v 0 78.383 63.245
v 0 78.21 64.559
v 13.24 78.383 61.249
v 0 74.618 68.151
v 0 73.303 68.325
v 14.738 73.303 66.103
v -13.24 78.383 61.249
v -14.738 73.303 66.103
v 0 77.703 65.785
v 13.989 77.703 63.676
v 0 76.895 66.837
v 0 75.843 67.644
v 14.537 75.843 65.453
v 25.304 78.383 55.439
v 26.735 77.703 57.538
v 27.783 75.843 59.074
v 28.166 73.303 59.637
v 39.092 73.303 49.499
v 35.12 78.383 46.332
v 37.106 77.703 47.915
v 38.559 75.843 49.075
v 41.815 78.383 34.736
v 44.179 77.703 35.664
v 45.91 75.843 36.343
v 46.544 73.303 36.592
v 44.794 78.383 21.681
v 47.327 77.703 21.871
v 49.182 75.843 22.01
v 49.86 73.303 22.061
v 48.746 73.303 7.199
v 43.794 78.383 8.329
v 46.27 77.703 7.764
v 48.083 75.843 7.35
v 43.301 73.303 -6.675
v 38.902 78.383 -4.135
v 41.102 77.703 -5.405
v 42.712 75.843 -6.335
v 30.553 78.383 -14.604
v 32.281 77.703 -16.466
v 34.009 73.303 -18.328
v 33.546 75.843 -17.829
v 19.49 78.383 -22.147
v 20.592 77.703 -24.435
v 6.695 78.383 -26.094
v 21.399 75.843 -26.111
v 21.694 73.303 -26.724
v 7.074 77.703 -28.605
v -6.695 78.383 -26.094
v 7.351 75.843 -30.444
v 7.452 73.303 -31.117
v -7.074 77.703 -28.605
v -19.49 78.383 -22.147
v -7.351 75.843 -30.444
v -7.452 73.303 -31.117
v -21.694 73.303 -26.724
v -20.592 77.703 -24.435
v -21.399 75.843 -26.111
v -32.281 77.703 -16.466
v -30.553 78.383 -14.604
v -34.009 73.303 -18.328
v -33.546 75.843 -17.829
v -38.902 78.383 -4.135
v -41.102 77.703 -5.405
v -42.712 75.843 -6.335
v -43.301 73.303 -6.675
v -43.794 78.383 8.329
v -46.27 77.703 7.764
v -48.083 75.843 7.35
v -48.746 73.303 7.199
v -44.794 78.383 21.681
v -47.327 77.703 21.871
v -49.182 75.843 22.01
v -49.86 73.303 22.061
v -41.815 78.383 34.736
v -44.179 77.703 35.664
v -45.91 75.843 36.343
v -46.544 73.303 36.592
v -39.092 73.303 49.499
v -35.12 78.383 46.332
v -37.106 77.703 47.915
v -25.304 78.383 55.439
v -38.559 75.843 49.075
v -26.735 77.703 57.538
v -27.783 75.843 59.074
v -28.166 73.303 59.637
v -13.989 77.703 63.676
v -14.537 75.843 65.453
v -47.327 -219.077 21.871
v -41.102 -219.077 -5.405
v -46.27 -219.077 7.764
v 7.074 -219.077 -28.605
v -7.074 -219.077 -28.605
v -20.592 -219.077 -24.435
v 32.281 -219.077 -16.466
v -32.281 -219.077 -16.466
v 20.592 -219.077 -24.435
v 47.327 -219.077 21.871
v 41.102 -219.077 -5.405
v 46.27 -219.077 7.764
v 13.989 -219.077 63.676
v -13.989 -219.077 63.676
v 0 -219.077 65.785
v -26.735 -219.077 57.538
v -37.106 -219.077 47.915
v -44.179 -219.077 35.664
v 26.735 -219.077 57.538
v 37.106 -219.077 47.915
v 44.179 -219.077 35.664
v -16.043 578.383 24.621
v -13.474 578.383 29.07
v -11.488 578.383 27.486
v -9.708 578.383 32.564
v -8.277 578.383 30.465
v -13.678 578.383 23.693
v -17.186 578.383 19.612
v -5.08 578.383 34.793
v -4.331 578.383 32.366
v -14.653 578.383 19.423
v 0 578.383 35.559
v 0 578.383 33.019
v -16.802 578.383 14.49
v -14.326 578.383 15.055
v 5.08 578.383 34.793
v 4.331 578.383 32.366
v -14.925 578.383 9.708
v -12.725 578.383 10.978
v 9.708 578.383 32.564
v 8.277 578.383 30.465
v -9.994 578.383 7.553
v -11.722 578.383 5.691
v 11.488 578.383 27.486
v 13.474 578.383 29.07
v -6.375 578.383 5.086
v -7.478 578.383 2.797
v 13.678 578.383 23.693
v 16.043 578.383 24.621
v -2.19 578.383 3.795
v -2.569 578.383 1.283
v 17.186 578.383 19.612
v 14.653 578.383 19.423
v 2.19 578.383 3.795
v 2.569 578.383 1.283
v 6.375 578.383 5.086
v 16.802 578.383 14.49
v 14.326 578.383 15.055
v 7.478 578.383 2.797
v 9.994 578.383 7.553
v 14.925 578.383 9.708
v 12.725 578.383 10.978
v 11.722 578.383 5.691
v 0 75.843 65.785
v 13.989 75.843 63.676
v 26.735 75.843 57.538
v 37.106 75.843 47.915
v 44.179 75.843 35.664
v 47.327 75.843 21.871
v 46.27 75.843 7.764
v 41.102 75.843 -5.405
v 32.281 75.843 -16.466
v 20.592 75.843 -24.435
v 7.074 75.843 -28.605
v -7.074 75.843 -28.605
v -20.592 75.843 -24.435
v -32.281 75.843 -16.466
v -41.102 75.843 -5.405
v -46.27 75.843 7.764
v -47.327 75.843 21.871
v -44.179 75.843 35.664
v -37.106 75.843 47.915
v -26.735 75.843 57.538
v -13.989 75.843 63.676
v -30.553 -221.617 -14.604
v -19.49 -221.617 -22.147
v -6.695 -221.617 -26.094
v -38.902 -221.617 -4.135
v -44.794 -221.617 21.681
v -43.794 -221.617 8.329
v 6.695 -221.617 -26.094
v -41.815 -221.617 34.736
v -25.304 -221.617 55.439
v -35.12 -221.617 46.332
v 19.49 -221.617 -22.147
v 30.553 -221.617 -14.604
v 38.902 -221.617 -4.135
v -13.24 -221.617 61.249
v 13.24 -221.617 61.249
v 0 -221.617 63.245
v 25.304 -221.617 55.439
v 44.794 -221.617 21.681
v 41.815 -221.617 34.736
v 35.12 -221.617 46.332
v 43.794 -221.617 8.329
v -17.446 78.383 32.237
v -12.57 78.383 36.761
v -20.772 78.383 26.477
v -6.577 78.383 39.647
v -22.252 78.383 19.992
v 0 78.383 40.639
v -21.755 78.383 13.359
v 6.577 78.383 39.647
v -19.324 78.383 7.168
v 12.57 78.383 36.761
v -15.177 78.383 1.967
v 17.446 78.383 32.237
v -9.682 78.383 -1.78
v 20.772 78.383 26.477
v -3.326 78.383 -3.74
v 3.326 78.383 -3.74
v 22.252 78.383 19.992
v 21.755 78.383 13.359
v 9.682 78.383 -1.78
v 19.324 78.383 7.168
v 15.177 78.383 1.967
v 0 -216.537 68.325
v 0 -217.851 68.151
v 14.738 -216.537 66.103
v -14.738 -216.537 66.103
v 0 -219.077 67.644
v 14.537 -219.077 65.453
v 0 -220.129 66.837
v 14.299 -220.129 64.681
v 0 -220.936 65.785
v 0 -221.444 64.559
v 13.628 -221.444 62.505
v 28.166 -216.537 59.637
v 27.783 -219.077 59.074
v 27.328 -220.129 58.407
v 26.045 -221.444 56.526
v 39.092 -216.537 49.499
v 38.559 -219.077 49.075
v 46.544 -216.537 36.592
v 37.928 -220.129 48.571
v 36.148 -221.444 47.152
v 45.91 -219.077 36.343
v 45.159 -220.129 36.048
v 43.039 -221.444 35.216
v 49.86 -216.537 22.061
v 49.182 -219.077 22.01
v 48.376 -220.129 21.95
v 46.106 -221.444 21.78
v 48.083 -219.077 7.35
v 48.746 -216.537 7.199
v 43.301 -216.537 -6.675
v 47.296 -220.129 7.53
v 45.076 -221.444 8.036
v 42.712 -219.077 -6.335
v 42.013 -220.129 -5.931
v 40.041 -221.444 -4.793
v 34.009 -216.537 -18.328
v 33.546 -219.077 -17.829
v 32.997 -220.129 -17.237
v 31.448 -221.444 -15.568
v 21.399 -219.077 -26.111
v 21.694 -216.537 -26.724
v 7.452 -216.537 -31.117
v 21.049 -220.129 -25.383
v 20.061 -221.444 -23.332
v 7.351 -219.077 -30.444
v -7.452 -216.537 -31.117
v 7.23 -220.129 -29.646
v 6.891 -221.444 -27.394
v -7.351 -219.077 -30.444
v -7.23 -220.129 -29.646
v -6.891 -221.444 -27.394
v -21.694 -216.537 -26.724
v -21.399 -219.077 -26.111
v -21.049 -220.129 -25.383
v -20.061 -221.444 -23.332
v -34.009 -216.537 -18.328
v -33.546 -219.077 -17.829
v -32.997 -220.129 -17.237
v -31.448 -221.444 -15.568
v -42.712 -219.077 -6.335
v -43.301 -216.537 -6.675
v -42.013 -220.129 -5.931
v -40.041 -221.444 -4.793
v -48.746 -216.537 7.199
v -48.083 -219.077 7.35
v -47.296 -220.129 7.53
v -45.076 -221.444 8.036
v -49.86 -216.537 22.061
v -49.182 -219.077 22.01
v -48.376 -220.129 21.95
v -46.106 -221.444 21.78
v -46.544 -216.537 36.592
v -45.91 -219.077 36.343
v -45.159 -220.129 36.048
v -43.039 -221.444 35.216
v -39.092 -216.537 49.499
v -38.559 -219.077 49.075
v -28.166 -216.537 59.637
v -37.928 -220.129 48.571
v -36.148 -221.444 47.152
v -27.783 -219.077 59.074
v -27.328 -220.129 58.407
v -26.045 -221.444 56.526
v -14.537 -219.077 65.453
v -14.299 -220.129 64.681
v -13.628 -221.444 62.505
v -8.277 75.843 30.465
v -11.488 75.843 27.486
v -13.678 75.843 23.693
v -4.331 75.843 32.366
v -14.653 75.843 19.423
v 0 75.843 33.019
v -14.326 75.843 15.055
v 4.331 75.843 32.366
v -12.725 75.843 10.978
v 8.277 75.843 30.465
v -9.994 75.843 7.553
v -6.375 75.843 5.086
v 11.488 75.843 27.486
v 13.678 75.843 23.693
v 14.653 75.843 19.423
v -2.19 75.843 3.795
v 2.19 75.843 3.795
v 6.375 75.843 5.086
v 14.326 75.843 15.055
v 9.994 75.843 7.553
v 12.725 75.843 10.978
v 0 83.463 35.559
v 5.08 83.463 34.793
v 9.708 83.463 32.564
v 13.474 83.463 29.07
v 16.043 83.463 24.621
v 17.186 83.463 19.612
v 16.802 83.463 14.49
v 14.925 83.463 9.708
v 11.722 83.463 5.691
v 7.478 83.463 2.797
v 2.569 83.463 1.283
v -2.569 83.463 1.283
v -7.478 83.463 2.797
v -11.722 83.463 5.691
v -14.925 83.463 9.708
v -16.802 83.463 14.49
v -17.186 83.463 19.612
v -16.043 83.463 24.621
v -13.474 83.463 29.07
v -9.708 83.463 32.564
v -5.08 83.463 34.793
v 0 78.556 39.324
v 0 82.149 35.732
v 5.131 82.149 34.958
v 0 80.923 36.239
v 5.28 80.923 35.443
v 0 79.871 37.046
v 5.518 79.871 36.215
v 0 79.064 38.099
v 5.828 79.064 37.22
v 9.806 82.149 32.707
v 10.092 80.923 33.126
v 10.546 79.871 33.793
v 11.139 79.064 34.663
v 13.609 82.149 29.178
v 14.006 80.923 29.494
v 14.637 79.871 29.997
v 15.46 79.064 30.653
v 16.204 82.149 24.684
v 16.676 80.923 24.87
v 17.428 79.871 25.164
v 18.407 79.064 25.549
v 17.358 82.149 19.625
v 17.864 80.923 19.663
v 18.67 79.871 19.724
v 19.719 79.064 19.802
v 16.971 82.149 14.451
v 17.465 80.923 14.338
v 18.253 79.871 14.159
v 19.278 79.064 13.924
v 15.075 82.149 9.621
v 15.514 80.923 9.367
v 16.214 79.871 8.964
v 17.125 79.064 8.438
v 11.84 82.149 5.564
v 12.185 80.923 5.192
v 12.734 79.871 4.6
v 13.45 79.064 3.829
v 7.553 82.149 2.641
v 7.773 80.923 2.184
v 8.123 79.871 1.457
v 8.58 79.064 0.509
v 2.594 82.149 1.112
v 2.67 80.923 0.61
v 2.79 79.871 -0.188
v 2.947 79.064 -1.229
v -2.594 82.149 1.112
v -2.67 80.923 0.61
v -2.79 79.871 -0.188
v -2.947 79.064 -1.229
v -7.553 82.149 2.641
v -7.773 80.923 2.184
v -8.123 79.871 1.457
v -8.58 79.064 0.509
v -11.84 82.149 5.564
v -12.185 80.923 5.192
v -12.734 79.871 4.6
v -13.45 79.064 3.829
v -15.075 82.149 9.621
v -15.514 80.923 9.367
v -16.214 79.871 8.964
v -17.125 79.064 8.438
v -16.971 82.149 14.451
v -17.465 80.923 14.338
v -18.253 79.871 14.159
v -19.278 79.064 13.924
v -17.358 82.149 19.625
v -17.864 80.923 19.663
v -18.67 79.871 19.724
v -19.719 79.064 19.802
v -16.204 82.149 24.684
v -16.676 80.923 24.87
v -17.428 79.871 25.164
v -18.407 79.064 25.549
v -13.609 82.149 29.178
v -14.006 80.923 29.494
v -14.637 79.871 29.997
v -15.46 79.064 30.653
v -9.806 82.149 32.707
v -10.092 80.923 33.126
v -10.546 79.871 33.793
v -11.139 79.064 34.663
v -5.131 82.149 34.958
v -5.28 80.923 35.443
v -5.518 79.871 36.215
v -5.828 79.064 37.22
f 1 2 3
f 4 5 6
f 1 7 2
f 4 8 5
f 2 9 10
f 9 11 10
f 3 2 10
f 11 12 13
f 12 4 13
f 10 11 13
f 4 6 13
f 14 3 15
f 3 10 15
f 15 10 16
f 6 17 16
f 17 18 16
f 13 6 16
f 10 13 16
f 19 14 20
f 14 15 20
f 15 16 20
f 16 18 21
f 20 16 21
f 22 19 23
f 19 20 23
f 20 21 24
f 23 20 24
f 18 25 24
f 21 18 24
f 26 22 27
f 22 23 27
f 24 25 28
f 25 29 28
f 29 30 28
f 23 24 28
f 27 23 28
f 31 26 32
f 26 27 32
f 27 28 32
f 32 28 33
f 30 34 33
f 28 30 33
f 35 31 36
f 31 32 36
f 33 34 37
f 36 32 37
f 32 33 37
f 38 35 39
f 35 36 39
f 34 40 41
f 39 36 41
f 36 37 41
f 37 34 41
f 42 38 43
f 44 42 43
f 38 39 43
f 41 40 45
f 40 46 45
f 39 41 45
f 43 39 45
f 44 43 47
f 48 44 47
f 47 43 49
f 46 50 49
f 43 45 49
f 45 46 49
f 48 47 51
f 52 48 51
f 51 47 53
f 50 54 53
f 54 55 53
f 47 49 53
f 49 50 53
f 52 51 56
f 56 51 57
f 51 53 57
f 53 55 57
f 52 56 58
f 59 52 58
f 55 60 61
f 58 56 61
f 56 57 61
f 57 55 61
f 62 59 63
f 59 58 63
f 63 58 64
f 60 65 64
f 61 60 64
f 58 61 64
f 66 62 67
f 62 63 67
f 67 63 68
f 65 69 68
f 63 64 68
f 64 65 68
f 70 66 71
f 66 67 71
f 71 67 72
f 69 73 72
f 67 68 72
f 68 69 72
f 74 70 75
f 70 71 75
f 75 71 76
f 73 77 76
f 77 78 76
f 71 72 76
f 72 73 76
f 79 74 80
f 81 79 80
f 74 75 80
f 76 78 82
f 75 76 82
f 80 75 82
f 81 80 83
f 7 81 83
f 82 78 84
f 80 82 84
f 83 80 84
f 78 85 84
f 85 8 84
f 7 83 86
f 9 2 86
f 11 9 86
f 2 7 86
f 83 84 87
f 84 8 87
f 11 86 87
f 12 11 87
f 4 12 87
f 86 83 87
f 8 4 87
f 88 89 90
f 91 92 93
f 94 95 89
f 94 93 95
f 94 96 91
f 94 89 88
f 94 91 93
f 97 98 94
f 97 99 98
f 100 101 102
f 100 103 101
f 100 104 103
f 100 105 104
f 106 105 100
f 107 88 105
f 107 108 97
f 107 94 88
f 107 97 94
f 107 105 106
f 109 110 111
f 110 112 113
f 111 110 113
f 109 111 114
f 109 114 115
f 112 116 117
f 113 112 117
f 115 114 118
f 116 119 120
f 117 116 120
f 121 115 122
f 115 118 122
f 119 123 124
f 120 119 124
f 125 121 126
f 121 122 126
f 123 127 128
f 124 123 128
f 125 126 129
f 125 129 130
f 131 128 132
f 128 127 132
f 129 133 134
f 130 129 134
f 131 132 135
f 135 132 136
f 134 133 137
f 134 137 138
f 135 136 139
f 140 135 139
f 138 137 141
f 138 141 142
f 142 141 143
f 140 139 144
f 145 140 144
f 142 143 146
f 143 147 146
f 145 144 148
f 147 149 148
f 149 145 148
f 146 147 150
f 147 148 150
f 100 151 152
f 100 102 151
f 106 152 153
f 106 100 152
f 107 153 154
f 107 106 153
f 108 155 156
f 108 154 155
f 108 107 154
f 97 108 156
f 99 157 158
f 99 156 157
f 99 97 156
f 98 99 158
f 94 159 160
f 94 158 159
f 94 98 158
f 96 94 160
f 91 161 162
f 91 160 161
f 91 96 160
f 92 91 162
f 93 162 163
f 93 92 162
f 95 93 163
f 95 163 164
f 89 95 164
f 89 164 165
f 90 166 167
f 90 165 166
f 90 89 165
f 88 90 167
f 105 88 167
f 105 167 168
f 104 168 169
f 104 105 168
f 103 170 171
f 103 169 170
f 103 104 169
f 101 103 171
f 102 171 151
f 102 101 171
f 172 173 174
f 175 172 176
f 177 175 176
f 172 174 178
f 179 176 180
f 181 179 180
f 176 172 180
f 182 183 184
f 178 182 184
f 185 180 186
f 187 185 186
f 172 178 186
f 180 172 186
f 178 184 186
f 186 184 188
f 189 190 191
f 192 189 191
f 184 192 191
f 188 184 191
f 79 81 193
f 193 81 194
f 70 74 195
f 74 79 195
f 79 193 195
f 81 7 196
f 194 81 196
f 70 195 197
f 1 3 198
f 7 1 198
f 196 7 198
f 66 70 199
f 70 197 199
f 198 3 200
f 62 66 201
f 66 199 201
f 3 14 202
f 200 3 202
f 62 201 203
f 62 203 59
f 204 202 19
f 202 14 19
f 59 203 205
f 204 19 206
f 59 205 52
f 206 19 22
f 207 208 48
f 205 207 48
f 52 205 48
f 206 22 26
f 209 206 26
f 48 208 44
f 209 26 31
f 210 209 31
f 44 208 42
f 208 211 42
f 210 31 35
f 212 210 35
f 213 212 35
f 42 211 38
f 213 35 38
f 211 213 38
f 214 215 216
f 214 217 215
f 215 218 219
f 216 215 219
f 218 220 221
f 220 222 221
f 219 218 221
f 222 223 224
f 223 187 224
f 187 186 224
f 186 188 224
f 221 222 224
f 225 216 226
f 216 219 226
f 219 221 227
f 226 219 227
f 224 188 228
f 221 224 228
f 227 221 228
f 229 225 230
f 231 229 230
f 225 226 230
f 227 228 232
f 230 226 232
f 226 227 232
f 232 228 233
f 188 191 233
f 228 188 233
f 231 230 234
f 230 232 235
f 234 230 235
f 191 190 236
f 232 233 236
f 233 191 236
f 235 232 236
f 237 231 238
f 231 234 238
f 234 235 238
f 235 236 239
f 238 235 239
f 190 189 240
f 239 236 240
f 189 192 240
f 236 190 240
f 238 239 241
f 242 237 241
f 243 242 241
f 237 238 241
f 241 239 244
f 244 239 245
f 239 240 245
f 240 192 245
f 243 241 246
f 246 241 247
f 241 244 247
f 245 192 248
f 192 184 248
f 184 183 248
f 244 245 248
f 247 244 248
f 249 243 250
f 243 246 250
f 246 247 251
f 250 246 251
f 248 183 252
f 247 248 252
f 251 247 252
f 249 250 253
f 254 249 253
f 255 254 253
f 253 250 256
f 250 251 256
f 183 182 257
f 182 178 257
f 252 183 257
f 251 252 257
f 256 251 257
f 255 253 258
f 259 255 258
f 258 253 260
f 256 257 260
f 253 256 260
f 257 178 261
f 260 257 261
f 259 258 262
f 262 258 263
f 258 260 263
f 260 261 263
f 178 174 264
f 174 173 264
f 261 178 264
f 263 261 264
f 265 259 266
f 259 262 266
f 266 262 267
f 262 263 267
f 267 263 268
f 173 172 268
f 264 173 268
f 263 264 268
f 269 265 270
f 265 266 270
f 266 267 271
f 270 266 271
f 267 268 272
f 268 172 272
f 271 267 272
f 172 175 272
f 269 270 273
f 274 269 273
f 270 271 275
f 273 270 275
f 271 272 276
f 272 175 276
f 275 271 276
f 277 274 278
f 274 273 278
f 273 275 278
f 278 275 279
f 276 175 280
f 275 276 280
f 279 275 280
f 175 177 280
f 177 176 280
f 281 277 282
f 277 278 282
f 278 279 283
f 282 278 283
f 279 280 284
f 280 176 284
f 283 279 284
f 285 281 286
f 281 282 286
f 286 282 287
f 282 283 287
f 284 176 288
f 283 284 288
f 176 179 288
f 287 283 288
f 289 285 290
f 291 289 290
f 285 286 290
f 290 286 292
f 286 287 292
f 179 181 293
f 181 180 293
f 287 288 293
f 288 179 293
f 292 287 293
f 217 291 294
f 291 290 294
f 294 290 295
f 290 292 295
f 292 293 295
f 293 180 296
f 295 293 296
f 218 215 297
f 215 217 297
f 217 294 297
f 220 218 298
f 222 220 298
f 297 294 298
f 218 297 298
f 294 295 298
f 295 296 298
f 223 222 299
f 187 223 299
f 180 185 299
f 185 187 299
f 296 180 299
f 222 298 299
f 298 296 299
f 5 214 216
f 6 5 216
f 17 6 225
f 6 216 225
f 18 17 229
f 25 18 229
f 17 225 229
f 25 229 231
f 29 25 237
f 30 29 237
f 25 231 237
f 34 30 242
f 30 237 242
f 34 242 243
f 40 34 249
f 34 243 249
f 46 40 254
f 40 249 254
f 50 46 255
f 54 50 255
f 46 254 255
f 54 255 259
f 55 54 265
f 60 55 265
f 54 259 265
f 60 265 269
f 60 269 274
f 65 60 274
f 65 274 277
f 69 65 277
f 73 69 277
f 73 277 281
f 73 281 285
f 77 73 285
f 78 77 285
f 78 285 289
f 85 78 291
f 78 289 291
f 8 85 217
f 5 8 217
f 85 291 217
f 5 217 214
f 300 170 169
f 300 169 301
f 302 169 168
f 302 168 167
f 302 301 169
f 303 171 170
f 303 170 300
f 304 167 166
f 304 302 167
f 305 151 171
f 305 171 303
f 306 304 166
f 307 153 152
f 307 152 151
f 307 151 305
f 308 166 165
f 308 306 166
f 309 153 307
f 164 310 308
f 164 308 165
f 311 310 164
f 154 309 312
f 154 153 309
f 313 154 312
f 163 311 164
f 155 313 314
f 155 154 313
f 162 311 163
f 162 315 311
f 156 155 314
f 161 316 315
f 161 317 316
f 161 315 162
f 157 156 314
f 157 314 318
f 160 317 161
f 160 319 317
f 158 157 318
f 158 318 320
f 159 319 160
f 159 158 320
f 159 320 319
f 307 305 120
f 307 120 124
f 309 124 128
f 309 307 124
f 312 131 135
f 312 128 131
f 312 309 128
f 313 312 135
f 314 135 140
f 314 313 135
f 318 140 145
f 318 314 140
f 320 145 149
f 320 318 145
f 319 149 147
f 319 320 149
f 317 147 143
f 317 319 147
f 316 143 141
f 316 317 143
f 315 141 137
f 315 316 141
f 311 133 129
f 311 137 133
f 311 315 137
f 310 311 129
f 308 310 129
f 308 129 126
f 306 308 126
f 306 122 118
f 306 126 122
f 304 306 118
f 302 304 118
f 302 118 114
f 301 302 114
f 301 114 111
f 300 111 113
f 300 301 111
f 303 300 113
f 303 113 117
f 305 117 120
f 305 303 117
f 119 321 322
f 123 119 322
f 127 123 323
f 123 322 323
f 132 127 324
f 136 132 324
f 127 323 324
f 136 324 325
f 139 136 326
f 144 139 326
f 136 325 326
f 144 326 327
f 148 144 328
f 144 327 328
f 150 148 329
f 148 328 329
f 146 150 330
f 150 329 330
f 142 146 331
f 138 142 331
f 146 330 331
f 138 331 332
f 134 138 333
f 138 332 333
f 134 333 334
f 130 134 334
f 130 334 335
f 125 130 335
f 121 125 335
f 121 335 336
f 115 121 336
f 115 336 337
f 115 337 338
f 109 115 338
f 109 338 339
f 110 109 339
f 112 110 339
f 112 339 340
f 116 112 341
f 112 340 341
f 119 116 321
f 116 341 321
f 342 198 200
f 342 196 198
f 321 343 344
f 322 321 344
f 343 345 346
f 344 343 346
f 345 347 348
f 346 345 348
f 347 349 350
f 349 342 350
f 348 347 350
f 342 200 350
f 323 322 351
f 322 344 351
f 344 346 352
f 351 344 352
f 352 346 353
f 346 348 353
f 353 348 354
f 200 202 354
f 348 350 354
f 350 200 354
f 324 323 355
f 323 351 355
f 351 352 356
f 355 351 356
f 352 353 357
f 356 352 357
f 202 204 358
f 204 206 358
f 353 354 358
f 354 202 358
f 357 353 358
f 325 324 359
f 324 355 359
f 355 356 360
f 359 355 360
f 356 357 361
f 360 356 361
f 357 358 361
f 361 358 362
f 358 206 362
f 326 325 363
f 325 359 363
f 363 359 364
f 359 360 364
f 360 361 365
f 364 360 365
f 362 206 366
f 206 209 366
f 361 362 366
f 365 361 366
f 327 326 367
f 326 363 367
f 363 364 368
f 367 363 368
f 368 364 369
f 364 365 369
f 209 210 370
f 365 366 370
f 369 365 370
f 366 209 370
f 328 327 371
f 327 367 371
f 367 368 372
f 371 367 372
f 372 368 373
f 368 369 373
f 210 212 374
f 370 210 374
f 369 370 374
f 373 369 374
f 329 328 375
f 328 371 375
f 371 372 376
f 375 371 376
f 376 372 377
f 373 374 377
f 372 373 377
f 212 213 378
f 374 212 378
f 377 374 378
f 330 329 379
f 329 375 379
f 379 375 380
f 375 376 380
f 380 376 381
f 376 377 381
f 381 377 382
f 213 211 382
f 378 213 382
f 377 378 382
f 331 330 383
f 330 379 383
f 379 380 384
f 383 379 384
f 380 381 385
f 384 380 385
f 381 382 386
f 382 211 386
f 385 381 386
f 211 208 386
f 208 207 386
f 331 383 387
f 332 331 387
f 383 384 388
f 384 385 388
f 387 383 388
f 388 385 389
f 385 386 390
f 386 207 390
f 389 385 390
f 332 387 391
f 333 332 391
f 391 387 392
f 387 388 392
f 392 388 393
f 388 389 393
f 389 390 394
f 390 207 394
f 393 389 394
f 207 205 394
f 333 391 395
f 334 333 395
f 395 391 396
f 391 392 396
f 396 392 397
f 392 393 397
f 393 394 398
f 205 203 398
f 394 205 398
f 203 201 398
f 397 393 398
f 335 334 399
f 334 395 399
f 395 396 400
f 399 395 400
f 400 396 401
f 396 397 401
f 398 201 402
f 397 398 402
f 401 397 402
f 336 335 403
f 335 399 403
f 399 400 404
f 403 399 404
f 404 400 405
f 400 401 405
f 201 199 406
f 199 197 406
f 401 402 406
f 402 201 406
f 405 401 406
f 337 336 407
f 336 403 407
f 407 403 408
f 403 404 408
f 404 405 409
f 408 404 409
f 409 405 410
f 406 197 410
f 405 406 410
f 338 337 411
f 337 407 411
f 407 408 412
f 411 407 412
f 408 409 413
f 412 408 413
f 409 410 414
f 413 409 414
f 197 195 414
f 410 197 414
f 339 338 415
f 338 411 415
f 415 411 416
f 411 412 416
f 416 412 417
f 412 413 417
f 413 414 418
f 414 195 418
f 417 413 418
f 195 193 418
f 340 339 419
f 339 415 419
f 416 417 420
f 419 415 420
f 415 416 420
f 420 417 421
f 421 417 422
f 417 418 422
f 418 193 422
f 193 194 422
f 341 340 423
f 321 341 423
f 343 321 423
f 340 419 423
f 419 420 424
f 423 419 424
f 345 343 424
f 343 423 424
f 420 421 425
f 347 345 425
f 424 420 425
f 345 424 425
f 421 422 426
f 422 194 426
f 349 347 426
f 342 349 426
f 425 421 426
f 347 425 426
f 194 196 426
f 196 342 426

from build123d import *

# Parameters (mm, degrees)
F2_T = -2.54
F3_R = 5.08


with BuildPart() as f1:
    # F0 (on Right) → F1 (revolve)
    with BuildSketch(Plane.YZ):
        Polygon((78.3833178774, 68.3245788985), (-221.6166821226, 68.3245788985), (-221.6166821226, 18.3245788985), (578.3833178774, 18.3245788985), (578.3833178774, 35.5585788985), (78.3833178774, 35.5585788985), align=None)
    revolve(axis=Axis((0, 178.3833178774, 18.3245788985), (0, 1, 0)))

    # F2
    f2_openings = [f1.faces().sort_by_distance(p)[0] for p in [
        (0, 578.383318, 18.324579),
    ]]
    offset(amount=F2_T, openings=f2_openings, kind=Kind.INTERSECTION)

    # F3
    f3_edges = [f1.edges().sort_by_distance(p)[0] for p in [
        (0, 78.383318, -31.675421),
        (0, 78.383318, 1.090579),
        (0, -221.616682, -31.675421),
    ]]
    fillet(f3_edges, radius=F3_R)


solid = f1.part
